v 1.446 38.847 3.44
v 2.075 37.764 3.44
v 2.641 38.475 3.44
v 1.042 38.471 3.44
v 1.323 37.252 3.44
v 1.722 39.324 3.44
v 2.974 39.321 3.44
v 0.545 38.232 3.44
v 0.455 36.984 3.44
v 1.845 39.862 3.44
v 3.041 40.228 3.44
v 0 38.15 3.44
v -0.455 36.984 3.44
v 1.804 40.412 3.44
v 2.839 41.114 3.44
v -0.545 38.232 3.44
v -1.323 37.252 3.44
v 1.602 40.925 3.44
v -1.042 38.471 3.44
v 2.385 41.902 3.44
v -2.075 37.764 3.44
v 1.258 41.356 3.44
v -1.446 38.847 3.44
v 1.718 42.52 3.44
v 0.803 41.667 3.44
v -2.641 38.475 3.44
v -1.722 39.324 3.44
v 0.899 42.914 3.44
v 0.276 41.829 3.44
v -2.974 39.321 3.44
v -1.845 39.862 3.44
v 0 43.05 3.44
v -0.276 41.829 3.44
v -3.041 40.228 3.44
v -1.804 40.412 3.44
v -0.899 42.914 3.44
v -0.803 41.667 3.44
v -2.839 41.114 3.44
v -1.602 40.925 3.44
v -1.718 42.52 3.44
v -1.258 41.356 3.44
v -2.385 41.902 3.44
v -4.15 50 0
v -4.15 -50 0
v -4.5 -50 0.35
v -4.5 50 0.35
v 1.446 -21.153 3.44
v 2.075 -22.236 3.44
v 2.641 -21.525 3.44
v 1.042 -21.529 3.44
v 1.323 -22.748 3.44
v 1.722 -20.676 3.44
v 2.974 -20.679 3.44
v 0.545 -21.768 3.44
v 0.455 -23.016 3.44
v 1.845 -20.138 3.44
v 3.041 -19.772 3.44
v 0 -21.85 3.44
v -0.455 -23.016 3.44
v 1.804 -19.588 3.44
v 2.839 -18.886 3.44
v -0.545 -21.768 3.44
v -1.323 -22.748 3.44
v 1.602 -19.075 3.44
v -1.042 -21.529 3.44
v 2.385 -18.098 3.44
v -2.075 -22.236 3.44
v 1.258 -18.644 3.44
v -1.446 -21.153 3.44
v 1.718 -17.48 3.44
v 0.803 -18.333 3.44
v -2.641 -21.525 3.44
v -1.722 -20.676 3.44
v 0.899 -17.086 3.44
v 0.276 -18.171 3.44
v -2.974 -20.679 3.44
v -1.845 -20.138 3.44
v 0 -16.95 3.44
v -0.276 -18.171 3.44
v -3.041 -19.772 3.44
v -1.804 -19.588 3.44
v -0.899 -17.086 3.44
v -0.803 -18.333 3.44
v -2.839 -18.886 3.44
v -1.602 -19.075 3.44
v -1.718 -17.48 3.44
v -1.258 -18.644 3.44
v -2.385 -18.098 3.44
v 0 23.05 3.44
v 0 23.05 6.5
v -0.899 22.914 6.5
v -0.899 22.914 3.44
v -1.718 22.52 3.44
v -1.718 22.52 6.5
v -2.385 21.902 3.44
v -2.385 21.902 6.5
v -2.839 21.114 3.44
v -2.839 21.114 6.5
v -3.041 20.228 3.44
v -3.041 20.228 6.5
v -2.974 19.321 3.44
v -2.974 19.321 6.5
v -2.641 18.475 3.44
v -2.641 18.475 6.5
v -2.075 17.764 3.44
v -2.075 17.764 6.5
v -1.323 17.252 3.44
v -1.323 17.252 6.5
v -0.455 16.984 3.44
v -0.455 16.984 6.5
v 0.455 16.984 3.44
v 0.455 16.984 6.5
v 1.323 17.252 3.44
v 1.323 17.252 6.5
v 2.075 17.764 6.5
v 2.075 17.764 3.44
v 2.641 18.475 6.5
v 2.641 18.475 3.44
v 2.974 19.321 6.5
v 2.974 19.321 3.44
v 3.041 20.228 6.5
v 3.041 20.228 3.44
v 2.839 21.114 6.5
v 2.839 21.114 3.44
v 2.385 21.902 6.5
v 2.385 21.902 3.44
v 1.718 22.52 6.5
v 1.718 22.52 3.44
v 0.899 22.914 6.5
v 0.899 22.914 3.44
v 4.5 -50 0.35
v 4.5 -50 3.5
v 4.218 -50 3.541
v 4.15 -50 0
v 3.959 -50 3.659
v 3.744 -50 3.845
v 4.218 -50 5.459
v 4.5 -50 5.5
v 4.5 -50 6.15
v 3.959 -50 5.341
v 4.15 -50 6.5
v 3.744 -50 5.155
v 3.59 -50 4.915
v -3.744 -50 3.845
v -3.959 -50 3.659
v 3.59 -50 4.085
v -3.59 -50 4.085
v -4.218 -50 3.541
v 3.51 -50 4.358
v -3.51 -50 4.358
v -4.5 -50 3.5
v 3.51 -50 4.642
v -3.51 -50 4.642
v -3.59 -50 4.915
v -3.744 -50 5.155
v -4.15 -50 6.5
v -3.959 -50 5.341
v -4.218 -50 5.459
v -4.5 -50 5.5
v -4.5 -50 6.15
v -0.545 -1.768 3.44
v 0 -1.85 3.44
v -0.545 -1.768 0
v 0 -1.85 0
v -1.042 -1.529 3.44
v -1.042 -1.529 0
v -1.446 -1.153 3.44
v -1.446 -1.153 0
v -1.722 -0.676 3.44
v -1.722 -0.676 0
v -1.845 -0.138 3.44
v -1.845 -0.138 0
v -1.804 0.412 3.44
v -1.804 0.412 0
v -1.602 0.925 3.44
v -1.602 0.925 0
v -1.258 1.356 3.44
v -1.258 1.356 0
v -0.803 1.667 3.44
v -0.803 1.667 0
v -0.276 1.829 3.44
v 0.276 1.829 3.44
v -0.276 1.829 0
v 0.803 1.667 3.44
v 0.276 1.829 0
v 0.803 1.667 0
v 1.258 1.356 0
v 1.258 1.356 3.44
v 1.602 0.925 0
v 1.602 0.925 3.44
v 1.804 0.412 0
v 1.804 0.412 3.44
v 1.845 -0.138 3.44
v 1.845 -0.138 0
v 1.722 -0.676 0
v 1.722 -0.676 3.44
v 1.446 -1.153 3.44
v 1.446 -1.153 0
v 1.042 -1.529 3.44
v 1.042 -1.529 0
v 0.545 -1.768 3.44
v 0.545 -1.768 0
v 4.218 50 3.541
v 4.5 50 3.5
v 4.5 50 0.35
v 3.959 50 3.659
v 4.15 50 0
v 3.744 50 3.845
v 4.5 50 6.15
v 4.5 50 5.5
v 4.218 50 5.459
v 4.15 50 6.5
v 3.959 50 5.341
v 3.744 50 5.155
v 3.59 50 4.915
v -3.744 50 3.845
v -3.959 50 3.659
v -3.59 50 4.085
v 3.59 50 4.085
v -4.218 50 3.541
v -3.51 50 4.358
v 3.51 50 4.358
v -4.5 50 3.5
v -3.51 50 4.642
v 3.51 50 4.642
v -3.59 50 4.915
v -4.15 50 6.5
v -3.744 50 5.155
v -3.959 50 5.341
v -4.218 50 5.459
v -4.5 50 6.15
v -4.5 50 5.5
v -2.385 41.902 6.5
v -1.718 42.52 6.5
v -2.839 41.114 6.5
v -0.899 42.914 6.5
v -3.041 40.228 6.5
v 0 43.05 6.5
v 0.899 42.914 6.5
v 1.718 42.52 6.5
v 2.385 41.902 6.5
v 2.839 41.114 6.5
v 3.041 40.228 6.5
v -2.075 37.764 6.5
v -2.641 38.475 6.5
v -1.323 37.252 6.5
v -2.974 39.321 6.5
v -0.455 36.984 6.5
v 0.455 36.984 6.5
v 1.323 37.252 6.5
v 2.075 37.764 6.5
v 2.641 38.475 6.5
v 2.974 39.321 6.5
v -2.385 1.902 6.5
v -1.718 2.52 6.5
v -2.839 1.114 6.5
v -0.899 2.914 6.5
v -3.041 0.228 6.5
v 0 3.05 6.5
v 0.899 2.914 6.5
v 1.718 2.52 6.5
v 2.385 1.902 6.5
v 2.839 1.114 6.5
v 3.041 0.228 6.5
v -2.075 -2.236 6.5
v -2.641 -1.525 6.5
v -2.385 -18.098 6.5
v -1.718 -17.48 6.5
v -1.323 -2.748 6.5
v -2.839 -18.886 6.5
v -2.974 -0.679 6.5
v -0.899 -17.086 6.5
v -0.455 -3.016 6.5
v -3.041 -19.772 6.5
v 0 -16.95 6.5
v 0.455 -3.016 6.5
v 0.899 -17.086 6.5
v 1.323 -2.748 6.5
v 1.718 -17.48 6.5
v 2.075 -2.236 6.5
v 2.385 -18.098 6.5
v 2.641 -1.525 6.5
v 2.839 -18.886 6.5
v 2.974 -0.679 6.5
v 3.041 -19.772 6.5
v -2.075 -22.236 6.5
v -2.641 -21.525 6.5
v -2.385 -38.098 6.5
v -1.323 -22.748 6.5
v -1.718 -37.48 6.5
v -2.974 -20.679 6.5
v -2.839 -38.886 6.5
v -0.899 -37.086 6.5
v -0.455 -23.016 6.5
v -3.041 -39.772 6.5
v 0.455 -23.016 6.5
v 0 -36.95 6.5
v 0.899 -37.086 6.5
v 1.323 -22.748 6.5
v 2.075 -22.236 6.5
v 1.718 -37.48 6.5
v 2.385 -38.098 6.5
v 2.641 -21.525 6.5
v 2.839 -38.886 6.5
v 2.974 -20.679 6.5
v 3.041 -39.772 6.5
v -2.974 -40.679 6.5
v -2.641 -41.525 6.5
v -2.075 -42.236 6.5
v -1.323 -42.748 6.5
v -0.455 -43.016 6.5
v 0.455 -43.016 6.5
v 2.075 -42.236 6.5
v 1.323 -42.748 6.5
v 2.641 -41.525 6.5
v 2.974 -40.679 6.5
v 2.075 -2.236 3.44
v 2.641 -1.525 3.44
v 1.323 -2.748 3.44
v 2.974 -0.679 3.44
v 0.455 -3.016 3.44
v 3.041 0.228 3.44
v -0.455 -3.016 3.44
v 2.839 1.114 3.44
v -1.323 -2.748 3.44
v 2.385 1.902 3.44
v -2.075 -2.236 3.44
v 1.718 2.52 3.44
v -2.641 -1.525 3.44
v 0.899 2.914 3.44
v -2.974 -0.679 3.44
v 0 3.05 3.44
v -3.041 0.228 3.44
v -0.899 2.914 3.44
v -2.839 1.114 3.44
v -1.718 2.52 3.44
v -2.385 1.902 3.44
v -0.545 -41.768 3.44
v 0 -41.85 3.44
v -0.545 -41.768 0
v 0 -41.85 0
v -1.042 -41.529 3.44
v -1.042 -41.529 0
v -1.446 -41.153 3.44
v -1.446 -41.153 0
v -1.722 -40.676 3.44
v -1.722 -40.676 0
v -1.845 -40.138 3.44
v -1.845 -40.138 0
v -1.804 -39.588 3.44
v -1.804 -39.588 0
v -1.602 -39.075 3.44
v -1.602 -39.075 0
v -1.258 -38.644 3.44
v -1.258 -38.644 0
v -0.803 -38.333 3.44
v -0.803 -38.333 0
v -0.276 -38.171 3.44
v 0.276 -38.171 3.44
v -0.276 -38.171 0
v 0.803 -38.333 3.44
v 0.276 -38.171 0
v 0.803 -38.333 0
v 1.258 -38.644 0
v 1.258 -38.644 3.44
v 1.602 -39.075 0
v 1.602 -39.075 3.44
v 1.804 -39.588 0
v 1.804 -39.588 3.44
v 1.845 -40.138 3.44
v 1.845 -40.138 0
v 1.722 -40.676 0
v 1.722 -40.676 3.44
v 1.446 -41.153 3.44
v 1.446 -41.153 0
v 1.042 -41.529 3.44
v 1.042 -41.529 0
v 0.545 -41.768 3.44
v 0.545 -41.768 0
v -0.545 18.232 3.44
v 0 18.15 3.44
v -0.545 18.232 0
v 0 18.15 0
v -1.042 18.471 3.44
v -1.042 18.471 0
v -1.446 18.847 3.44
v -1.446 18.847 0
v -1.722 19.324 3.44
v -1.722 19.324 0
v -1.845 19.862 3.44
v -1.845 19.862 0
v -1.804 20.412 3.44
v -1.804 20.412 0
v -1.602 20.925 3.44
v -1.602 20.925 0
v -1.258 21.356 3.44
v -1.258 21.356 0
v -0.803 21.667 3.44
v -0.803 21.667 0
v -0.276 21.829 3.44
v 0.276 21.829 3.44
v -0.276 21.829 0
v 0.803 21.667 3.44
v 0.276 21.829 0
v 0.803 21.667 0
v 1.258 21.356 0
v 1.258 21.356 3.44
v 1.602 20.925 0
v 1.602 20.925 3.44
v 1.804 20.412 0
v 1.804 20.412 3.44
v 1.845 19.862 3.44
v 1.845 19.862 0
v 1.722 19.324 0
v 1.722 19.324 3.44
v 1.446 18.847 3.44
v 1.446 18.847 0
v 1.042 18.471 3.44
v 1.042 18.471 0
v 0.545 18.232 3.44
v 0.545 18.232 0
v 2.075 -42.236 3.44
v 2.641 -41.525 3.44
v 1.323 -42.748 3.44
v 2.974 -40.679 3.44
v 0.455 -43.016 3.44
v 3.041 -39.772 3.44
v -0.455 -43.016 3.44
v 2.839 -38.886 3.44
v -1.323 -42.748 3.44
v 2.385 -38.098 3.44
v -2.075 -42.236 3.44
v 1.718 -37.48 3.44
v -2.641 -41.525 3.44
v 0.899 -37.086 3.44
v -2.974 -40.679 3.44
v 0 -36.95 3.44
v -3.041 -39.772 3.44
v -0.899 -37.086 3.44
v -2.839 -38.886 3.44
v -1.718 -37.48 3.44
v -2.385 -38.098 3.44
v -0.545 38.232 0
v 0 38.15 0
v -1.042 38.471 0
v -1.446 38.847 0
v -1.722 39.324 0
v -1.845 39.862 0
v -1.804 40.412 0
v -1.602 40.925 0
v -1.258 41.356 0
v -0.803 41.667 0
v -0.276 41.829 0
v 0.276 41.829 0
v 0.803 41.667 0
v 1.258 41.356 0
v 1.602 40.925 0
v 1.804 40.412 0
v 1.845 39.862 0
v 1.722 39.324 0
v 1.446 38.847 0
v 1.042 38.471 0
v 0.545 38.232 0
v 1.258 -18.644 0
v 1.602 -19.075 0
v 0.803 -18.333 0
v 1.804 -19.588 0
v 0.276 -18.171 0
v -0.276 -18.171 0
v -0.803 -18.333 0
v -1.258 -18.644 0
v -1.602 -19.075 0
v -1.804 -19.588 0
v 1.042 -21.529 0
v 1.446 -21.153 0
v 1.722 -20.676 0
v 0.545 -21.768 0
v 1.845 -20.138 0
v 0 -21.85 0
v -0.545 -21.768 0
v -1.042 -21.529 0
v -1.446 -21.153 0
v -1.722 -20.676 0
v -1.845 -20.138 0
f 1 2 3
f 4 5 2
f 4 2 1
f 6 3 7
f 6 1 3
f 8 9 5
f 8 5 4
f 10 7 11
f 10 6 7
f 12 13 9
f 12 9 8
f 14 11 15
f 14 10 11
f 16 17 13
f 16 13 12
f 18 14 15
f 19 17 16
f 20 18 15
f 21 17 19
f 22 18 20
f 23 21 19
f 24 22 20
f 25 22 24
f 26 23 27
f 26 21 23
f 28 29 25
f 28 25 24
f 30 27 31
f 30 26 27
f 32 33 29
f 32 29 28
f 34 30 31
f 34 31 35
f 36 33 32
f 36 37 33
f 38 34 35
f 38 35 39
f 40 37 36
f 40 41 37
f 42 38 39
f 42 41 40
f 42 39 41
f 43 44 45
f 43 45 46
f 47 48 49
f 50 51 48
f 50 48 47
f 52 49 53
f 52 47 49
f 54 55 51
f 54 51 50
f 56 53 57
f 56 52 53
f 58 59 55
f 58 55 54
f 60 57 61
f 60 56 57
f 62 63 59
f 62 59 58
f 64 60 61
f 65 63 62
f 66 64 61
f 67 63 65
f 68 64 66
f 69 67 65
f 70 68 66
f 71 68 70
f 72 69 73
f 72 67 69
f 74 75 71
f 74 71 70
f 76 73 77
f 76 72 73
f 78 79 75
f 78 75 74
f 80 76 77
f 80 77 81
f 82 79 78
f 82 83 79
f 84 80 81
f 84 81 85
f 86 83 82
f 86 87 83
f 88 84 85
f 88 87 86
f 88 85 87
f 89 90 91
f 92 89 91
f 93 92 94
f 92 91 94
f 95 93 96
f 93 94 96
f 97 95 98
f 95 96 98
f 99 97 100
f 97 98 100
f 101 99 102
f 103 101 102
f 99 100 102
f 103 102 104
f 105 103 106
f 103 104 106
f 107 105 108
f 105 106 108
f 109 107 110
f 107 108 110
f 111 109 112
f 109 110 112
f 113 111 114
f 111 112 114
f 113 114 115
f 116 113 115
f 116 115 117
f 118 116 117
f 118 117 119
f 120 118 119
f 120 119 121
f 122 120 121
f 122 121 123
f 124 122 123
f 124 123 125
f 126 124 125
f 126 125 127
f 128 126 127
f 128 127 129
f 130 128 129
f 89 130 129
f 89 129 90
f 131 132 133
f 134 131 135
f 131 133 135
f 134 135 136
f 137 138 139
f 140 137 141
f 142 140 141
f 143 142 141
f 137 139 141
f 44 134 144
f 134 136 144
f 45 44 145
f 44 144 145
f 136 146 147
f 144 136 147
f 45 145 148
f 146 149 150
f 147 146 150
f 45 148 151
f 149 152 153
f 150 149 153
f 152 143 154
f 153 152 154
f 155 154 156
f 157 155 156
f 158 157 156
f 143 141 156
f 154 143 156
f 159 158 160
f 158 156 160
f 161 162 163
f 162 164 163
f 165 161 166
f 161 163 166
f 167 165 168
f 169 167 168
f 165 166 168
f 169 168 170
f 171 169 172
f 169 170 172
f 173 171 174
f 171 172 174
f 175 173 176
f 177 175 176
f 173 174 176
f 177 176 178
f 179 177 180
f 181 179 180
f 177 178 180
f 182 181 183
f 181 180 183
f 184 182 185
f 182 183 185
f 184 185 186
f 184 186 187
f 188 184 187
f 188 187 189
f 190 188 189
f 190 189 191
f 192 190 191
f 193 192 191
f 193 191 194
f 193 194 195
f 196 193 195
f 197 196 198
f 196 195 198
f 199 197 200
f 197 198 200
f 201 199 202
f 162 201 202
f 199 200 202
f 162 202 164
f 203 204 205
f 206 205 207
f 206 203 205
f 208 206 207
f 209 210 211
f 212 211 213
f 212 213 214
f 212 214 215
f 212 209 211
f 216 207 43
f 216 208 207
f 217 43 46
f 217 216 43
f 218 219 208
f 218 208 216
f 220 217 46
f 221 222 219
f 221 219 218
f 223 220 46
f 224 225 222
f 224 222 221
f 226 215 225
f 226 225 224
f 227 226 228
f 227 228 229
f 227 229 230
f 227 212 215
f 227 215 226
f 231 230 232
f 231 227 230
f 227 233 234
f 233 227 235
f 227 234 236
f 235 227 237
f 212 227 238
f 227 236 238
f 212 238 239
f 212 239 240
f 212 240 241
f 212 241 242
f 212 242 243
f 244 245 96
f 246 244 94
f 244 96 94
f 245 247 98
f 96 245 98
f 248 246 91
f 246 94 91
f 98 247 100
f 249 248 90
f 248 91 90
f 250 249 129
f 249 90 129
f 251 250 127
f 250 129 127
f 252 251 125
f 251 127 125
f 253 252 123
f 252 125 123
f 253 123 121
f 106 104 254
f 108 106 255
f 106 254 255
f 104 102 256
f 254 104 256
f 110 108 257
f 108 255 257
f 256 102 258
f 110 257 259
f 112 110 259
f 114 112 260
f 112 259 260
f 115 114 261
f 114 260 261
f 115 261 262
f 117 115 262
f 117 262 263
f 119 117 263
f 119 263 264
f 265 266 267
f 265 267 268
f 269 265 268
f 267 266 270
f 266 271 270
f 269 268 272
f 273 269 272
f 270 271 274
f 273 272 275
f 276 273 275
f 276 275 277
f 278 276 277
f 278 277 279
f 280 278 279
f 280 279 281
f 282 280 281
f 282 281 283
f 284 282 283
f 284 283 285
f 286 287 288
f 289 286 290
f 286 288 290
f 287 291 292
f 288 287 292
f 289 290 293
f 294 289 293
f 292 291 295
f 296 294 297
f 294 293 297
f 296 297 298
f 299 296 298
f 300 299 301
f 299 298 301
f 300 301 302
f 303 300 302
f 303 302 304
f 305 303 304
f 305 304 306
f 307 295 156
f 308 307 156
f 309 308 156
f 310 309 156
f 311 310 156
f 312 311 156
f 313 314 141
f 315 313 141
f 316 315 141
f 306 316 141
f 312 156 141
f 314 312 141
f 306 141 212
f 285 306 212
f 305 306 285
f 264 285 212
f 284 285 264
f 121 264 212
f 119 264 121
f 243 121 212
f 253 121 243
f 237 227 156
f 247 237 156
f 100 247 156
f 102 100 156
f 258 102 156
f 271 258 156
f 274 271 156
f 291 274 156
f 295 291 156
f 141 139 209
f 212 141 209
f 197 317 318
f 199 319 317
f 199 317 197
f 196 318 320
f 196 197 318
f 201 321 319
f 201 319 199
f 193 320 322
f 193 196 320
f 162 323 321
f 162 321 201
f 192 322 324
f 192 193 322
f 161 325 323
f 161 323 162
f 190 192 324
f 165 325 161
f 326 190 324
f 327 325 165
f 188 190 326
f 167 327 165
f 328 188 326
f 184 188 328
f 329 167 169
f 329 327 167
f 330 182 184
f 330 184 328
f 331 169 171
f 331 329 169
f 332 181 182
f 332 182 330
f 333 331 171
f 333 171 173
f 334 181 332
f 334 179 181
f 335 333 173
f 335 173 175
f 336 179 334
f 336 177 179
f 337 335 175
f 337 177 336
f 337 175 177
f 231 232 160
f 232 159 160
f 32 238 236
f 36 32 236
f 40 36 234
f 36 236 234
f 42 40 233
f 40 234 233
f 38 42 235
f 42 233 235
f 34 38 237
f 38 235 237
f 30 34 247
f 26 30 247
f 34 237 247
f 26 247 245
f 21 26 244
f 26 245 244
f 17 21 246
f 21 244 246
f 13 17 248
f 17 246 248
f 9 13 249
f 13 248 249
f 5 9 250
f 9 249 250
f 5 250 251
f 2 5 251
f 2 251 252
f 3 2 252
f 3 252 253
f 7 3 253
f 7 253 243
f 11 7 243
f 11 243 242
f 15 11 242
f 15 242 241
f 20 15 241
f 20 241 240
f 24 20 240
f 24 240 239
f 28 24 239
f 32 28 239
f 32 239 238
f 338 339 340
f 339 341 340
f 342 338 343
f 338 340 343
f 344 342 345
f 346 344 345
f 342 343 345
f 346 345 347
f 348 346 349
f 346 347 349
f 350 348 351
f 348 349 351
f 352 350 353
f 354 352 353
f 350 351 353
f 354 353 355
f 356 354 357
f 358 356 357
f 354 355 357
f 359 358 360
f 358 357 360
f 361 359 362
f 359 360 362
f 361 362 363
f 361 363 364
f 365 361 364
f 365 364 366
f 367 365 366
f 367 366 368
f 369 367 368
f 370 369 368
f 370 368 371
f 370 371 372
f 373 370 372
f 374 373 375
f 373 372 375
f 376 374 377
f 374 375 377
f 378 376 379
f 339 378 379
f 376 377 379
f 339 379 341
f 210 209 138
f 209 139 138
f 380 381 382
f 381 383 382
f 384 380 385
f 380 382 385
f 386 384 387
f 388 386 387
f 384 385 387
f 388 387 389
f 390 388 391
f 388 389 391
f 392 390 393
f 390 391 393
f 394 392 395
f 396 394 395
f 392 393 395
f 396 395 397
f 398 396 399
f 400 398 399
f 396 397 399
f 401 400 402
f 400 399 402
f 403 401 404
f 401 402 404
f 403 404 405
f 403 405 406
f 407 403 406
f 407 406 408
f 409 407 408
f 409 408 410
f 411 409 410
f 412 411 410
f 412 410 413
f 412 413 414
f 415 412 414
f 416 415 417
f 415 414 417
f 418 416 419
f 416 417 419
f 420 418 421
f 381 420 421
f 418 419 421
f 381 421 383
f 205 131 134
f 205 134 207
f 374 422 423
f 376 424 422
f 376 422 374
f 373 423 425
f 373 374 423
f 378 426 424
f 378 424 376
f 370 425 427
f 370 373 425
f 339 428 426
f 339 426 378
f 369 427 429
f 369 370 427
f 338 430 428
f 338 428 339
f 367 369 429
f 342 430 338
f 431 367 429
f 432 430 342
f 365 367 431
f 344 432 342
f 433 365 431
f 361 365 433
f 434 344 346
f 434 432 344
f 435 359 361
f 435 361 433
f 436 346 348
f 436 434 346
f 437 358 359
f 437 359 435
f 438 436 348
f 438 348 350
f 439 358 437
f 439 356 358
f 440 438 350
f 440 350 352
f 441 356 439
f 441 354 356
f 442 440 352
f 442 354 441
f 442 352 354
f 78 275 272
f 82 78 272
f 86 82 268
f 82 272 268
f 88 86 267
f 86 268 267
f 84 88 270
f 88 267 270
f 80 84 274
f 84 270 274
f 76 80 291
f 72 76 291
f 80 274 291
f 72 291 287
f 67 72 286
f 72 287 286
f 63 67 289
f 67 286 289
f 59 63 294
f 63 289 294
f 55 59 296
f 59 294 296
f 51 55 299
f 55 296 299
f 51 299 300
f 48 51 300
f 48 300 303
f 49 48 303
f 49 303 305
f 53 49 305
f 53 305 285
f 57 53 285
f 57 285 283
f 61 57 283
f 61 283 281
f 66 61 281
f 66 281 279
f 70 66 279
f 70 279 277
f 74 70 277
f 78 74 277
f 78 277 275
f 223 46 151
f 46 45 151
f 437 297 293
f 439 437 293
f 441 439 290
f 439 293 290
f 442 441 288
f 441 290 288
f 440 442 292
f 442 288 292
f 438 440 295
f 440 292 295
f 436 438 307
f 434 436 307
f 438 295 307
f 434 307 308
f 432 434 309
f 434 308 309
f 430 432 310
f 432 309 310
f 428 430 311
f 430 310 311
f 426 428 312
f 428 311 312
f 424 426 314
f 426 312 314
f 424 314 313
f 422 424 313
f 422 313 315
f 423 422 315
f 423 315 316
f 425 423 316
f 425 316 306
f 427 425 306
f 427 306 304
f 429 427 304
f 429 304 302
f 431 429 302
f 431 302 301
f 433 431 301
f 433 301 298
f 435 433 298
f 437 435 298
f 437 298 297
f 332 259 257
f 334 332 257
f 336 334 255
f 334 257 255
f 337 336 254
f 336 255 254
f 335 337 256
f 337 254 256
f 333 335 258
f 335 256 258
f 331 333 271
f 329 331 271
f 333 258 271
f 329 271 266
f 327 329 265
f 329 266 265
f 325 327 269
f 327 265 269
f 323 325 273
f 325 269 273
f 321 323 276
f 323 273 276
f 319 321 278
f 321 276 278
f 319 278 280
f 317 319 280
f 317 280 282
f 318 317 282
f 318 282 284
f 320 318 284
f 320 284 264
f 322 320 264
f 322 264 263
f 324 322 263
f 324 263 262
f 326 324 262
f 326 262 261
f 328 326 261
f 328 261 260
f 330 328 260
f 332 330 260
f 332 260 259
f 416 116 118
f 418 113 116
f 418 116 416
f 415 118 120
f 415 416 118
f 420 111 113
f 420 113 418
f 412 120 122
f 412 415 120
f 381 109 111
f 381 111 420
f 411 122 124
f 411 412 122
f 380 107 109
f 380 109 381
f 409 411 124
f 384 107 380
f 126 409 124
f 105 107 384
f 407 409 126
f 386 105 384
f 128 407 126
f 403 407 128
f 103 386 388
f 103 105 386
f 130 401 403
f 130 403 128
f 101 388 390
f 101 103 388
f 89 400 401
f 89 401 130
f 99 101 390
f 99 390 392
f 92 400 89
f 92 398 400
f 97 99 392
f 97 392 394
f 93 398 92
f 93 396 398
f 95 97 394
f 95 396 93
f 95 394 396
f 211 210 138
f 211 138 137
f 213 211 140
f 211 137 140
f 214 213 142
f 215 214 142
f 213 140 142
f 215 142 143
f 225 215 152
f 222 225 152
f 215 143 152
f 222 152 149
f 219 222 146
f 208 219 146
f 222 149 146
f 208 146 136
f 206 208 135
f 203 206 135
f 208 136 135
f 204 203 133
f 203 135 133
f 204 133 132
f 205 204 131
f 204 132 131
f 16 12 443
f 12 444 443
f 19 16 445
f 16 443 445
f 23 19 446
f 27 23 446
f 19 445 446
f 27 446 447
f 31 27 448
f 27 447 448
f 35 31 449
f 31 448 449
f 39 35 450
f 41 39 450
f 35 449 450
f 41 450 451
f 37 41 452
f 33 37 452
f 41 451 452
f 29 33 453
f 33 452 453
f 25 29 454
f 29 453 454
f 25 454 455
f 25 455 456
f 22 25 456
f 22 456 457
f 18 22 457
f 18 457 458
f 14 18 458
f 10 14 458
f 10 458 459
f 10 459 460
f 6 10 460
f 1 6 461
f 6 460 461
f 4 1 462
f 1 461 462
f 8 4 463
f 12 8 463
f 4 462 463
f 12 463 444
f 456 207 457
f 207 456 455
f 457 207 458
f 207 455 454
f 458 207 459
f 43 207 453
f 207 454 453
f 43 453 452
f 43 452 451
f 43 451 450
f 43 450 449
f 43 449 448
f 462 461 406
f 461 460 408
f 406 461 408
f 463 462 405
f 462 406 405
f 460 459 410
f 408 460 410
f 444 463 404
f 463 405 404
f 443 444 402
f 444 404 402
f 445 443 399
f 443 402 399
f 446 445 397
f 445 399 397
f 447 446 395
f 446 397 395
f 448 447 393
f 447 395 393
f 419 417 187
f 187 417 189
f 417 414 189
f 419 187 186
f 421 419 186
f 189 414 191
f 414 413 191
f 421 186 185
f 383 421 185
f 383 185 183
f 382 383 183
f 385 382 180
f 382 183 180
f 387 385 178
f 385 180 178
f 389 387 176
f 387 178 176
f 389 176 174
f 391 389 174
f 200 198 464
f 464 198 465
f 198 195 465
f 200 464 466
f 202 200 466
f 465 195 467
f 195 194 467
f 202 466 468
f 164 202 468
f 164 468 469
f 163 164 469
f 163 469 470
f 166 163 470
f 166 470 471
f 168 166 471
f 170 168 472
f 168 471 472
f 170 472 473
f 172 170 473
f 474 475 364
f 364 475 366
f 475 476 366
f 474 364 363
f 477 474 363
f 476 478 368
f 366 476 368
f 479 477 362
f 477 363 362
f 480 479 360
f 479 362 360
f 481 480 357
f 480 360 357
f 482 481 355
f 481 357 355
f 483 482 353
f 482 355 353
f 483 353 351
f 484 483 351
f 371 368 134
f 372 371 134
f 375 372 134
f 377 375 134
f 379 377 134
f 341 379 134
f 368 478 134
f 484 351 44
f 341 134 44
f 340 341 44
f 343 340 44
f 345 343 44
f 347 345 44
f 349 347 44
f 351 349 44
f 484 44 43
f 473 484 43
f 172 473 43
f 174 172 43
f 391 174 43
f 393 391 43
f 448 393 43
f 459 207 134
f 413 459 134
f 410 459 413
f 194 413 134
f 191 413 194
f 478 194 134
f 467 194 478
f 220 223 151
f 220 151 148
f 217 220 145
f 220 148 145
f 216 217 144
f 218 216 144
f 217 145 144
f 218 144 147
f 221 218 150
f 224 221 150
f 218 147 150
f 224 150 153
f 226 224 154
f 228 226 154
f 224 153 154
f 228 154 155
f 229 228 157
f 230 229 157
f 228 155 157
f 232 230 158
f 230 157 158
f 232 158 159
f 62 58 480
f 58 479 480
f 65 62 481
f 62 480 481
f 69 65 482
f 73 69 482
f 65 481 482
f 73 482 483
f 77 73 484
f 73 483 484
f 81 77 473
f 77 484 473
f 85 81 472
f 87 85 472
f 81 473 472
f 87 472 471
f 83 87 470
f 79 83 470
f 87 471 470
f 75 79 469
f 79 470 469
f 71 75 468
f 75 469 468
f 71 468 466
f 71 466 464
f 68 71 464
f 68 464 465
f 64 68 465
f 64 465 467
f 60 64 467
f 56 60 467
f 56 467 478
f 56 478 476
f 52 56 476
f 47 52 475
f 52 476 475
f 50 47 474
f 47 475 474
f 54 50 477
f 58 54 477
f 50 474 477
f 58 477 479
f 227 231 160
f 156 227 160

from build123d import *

# Parameters (mm, degrees)
PAD_DEPTH           = 50
CHAMFER003_SIZE     = 0.35
HOLE001_D           = 3.7
HOLE001_CBORE_D     = 6.1
HOLE001_CBORE_DEPTH = 3.06


with BuildPart() as part:
    # Sketch → Pad (new body, symmetric)
    with BuildSketch(Plane.XZ):
        with BuildLine():
            Line((-4.5, 6.5), (4.5, 6.5))
            Line((4.5, 6.5), (4.5, 5.5))
            ThreePointArc((4.5, 5.5), (3.5, 4.5), (4.5, 3.5))
            Line((4.5, 3.5), (4.5, 0))
            Line((4.5, 0), (-4.5, 0))
            Line((-4.5, 0), (-4.5, 3.5))
            ThreePointArc((-4.5, 3.5), (-3.5, 4.5), (-4.5, 5.5))
            Line((-4.5, 5.5), (-4.5, 6.5))
        make_face()
    extrude(amount=PAD_DEPTH, both=True)

    # Chamfer003
    chamfer003_edges = [part.edges().sort_by_distance(p)[0] for p in [
        (4.5, 0, 6.5),
        (4.5, 0, 0),
        (-4.5, 0, 0),
        (-4.5, 0, 6.5),
    ]]
    chamfer(chamfer003_edges, length=CHAMFER003_SIZE)

    # Hole001 (through all)
    with Locations(Plane(origin=(0, 0, 6.5), x_dir=(0, 1, 0), z_dir=(0, 0, 1))):
        with Locations((0, 0), (-20, 0), (-40, 0), (-60, 0), (-80, 0), (-100, 0), (-120, 0), (-140, 0), (-160, 0), (-180, 0), (20, 0), (40, 0), (60, 0), (80, 0), (100, 0), (120, 0), (140, 0), (160, 0), (180, 0)):
            CounterBoreHole(HOLE001_D / 2, HOLE001_CBORE_D / 2, HOLE001_CBORE_DEPTH)


solid = part.part
